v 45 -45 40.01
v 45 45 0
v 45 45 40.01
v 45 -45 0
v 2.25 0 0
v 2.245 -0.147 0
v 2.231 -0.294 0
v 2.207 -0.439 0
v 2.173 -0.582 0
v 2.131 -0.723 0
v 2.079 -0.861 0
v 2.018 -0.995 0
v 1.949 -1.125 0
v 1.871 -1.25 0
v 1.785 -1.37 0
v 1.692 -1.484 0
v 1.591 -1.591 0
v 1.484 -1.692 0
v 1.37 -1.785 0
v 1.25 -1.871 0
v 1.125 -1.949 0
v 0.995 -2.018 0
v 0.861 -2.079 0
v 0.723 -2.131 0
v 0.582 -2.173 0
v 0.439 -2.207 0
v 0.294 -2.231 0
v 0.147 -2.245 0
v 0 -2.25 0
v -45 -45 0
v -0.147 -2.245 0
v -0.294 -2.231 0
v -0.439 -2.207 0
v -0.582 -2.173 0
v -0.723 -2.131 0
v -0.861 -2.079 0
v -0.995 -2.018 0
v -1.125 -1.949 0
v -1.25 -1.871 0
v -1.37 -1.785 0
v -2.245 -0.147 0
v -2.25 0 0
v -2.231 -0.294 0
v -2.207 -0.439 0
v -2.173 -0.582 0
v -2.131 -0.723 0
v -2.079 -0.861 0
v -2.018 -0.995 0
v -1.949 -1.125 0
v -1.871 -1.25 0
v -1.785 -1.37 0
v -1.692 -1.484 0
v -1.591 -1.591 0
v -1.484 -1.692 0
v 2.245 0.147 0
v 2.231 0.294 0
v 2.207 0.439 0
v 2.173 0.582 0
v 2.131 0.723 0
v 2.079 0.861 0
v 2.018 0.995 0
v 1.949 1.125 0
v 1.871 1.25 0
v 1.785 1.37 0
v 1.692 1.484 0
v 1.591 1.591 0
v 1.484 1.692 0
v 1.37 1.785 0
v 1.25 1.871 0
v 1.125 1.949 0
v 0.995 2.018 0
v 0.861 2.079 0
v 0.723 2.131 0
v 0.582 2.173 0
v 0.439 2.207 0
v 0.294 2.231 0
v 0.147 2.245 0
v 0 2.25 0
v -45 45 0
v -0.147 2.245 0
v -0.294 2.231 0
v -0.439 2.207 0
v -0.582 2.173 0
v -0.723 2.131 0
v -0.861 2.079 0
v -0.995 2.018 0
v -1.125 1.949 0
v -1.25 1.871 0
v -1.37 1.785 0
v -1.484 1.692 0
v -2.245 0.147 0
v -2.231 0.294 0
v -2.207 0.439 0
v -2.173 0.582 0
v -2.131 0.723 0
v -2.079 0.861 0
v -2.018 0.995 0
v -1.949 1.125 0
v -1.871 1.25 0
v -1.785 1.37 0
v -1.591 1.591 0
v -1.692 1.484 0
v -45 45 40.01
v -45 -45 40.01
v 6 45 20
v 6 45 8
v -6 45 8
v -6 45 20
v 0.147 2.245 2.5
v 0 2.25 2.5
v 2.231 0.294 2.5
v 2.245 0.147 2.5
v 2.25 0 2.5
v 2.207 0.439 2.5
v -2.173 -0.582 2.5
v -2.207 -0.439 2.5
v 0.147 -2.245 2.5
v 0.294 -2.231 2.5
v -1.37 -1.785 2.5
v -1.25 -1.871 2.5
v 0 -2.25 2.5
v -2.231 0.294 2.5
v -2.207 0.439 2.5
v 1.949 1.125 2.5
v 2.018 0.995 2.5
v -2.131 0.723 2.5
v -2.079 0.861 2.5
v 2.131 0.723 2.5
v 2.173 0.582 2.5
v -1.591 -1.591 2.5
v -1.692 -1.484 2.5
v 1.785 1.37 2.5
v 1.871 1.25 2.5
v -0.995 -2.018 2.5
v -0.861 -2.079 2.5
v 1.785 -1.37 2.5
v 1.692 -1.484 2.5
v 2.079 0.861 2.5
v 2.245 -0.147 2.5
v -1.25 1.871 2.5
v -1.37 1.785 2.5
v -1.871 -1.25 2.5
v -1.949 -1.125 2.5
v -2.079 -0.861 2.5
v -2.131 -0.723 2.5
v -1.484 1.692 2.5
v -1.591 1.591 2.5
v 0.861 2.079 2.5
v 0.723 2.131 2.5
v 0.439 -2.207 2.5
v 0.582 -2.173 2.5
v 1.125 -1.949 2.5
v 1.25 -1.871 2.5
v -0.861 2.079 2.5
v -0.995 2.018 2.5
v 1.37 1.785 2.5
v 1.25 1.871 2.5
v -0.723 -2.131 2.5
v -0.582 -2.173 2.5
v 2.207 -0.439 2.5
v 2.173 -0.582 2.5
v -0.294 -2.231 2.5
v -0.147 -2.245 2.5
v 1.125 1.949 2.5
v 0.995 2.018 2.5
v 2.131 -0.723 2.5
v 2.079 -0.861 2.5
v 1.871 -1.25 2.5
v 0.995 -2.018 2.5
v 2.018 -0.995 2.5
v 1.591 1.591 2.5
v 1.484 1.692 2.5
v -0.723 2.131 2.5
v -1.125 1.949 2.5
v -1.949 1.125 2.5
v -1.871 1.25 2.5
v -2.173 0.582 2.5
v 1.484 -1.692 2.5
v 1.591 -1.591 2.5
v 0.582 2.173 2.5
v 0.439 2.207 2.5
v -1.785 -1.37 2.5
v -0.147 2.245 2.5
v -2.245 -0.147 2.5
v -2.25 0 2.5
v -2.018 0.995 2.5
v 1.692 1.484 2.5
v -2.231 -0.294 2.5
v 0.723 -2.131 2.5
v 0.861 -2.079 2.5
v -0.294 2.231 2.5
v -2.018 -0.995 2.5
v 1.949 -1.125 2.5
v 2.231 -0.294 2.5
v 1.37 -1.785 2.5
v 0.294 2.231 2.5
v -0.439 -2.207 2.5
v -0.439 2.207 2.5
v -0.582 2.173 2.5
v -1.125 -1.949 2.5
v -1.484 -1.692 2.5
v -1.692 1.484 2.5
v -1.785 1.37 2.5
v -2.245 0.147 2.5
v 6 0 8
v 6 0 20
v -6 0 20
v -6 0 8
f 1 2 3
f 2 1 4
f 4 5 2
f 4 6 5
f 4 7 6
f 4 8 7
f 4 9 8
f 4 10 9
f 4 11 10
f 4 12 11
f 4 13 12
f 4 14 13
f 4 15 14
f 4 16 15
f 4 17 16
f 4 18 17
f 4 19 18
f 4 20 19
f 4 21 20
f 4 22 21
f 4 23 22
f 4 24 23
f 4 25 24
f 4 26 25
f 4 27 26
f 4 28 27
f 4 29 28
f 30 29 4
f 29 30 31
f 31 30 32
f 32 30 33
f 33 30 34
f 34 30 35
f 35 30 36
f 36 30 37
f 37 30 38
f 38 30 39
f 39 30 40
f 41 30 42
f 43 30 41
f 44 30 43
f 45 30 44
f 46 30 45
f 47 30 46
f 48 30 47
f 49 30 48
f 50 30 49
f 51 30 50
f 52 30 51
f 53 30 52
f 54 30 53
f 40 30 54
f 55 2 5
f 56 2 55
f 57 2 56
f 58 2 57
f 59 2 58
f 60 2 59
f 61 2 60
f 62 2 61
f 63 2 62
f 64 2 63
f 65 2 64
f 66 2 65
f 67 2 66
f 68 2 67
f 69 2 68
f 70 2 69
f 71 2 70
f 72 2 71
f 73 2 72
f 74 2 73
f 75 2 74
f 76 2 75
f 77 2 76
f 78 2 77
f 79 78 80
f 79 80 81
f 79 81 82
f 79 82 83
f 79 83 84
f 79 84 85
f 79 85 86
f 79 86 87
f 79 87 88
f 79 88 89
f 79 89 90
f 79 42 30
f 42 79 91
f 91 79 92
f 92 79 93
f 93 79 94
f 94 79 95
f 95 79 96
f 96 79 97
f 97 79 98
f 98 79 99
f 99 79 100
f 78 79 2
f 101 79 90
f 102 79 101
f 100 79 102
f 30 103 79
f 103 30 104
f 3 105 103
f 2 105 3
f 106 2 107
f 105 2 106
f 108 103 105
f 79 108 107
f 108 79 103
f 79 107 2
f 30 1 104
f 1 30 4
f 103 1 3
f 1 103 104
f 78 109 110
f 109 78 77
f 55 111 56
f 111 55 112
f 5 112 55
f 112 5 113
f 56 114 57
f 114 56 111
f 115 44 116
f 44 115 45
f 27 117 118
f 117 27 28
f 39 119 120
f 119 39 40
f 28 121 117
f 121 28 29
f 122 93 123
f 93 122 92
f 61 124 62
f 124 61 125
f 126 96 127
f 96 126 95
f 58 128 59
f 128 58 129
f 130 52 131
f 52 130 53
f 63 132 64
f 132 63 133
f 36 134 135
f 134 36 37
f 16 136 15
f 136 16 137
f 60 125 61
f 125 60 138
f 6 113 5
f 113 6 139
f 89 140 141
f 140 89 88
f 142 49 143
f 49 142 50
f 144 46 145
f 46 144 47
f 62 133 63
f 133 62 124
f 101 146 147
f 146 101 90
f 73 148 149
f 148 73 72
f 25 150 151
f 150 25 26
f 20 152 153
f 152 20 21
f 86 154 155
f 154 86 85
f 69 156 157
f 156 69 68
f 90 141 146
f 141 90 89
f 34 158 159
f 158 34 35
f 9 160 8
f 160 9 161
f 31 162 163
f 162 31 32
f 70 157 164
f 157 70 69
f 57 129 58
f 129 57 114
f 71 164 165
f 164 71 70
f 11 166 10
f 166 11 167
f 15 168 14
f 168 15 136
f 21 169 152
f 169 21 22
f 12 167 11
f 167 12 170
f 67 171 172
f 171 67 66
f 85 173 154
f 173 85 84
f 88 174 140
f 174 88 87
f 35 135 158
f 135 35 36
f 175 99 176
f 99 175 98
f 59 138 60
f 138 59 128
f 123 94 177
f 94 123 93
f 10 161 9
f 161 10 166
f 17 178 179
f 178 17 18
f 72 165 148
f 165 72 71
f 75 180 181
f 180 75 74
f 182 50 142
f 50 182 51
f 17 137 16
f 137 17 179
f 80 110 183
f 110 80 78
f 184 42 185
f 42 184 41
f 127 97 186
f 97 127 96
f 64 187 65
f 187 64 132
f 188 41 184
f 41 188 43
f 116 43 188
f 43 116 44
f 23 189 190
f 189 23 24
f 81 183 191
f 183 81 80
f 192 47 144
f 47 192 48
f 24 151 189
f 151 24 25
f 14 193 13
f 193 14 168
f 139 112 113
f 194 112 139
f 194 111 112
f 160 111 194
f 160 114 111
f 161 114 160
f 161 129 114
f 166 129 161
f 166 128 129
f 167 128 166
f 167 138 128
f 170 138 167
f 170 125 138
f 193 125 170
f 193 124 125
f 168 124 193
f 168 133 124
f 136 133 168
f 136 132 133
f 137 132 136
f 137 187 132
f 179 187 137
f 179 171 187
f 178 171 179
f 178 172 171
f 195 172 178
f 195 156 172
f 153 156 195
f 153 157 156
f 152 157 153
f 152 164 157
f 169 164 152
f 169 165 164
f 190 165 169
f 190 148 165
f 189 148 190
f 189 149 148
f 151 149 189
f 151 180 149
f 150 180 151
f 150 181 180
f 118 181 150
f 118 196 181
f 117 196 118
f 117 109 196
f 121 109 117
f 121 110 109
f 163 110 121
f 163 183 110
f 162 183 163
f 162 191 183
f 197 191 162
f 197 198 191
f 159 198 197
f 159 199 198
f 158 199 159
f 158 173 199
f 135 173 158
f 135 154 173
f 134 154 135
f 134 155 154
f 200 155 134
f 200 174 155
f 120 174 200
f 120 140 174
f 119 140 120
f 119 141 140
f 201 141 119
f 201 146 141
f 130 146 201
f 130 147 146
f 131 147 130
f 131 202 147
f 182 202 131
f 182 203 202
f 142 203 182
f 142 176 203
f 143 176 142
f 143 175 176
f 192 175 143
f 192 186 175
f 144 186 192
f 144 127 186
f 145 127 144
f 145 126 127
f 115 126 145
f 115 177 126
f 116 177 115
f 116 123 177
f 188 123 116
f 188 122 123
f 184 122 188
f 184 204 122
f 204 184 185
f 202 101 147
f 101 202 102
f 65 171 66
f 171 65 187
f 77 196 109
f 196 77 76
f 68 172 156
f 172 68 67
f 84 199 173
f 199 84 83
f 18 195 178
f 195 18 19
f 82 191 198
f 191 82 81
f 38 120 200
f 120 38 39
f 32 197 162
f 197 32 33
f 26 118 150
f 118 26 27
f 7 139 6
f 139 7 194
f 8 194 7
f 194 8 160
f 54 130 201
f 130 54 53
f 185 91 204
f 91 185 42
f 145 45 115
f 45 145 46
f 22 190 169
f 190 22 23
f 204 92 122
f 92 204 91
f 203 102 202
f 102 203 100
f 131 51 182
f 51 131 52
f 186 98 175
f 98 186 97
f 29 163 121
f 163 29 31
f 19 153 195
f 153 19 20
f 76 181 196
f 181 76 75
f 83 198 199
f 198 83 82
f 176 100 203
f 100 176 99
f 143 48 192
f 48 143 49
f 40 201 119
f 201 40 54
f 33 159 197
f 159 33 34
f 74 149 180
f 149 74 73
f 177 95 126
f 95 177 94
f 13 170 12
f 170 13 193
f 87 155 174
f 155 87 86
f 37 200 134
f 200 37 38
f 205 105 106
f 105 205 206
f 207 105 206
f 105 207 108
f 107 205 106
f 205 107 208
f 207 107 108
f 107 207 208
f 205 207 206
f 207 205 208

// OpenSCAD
// Magnetic stirrer housing - open box covering an 80 mm PC case fan
// Print orientation: top plate on bed (z = 0), walls rise to open top (z = 40)

// ---------- Parameters ----------
outer_x      = 90;    // outer size in X (mm)
outer_y      = 90;    // outer size in Y (mm)
plate_t      = 2;     // top plate thickness (mm)
wall_t       = 2.5;   // wall thickness (mm)
open_top_z   = 40;    // height of open top / wall tops (mm)
screw_holes  = 4;     // number of M4 screw holes
screw_d      = 4.5;   // screw hole diameter (mm)
screw_pitch  = 71.5;  // square pattern size for screw holes (mm)
notch_w      = 12;    // power cable notch width (mm)
notch_bottom = 8;     // notch depth from open edge (mm), z = 32..40

eps          = 0.5;   // cutter overshoot past faces (mm)
$fn          = 96;    // curve resolution

// ---------- Model ----------
difference() {
    // Solid block: top plate + four walls
    union() {
        // Top plate (lies on bed in print orientation)
        translate([-outer_x/2, -outer_y/2, 0])
            cube([outer_x, outer_y, plate_t]);

        // Inner hollow, open at the top (from z = plate_t up to open_top_z)
        translate([-outer_x/2, -outer_y/2, plate_t])
            cube([outer_x, outer_y, open_top_z - plate_t + 0.01]);
    }

    // Screw holes through the top plate, centred on the plate
    for (i = [0 : screw_holes - 1]) {
        rotate([0, 0, i * 360 / screw_holes])
            translate([0, 0, -eps])
                cylinder(d = screw_d, h = plate_t + 2 * eps);
    }

    // Cable notch in one wall: centred along the wall, z = 32..40
    translate([-outer_x/2 + (outer_x - notch_w)/2, 0, notch_bottom])
        cube([notch_w, outer_y, notch_w]);  // square notch, w x h = 12 x 12
}
